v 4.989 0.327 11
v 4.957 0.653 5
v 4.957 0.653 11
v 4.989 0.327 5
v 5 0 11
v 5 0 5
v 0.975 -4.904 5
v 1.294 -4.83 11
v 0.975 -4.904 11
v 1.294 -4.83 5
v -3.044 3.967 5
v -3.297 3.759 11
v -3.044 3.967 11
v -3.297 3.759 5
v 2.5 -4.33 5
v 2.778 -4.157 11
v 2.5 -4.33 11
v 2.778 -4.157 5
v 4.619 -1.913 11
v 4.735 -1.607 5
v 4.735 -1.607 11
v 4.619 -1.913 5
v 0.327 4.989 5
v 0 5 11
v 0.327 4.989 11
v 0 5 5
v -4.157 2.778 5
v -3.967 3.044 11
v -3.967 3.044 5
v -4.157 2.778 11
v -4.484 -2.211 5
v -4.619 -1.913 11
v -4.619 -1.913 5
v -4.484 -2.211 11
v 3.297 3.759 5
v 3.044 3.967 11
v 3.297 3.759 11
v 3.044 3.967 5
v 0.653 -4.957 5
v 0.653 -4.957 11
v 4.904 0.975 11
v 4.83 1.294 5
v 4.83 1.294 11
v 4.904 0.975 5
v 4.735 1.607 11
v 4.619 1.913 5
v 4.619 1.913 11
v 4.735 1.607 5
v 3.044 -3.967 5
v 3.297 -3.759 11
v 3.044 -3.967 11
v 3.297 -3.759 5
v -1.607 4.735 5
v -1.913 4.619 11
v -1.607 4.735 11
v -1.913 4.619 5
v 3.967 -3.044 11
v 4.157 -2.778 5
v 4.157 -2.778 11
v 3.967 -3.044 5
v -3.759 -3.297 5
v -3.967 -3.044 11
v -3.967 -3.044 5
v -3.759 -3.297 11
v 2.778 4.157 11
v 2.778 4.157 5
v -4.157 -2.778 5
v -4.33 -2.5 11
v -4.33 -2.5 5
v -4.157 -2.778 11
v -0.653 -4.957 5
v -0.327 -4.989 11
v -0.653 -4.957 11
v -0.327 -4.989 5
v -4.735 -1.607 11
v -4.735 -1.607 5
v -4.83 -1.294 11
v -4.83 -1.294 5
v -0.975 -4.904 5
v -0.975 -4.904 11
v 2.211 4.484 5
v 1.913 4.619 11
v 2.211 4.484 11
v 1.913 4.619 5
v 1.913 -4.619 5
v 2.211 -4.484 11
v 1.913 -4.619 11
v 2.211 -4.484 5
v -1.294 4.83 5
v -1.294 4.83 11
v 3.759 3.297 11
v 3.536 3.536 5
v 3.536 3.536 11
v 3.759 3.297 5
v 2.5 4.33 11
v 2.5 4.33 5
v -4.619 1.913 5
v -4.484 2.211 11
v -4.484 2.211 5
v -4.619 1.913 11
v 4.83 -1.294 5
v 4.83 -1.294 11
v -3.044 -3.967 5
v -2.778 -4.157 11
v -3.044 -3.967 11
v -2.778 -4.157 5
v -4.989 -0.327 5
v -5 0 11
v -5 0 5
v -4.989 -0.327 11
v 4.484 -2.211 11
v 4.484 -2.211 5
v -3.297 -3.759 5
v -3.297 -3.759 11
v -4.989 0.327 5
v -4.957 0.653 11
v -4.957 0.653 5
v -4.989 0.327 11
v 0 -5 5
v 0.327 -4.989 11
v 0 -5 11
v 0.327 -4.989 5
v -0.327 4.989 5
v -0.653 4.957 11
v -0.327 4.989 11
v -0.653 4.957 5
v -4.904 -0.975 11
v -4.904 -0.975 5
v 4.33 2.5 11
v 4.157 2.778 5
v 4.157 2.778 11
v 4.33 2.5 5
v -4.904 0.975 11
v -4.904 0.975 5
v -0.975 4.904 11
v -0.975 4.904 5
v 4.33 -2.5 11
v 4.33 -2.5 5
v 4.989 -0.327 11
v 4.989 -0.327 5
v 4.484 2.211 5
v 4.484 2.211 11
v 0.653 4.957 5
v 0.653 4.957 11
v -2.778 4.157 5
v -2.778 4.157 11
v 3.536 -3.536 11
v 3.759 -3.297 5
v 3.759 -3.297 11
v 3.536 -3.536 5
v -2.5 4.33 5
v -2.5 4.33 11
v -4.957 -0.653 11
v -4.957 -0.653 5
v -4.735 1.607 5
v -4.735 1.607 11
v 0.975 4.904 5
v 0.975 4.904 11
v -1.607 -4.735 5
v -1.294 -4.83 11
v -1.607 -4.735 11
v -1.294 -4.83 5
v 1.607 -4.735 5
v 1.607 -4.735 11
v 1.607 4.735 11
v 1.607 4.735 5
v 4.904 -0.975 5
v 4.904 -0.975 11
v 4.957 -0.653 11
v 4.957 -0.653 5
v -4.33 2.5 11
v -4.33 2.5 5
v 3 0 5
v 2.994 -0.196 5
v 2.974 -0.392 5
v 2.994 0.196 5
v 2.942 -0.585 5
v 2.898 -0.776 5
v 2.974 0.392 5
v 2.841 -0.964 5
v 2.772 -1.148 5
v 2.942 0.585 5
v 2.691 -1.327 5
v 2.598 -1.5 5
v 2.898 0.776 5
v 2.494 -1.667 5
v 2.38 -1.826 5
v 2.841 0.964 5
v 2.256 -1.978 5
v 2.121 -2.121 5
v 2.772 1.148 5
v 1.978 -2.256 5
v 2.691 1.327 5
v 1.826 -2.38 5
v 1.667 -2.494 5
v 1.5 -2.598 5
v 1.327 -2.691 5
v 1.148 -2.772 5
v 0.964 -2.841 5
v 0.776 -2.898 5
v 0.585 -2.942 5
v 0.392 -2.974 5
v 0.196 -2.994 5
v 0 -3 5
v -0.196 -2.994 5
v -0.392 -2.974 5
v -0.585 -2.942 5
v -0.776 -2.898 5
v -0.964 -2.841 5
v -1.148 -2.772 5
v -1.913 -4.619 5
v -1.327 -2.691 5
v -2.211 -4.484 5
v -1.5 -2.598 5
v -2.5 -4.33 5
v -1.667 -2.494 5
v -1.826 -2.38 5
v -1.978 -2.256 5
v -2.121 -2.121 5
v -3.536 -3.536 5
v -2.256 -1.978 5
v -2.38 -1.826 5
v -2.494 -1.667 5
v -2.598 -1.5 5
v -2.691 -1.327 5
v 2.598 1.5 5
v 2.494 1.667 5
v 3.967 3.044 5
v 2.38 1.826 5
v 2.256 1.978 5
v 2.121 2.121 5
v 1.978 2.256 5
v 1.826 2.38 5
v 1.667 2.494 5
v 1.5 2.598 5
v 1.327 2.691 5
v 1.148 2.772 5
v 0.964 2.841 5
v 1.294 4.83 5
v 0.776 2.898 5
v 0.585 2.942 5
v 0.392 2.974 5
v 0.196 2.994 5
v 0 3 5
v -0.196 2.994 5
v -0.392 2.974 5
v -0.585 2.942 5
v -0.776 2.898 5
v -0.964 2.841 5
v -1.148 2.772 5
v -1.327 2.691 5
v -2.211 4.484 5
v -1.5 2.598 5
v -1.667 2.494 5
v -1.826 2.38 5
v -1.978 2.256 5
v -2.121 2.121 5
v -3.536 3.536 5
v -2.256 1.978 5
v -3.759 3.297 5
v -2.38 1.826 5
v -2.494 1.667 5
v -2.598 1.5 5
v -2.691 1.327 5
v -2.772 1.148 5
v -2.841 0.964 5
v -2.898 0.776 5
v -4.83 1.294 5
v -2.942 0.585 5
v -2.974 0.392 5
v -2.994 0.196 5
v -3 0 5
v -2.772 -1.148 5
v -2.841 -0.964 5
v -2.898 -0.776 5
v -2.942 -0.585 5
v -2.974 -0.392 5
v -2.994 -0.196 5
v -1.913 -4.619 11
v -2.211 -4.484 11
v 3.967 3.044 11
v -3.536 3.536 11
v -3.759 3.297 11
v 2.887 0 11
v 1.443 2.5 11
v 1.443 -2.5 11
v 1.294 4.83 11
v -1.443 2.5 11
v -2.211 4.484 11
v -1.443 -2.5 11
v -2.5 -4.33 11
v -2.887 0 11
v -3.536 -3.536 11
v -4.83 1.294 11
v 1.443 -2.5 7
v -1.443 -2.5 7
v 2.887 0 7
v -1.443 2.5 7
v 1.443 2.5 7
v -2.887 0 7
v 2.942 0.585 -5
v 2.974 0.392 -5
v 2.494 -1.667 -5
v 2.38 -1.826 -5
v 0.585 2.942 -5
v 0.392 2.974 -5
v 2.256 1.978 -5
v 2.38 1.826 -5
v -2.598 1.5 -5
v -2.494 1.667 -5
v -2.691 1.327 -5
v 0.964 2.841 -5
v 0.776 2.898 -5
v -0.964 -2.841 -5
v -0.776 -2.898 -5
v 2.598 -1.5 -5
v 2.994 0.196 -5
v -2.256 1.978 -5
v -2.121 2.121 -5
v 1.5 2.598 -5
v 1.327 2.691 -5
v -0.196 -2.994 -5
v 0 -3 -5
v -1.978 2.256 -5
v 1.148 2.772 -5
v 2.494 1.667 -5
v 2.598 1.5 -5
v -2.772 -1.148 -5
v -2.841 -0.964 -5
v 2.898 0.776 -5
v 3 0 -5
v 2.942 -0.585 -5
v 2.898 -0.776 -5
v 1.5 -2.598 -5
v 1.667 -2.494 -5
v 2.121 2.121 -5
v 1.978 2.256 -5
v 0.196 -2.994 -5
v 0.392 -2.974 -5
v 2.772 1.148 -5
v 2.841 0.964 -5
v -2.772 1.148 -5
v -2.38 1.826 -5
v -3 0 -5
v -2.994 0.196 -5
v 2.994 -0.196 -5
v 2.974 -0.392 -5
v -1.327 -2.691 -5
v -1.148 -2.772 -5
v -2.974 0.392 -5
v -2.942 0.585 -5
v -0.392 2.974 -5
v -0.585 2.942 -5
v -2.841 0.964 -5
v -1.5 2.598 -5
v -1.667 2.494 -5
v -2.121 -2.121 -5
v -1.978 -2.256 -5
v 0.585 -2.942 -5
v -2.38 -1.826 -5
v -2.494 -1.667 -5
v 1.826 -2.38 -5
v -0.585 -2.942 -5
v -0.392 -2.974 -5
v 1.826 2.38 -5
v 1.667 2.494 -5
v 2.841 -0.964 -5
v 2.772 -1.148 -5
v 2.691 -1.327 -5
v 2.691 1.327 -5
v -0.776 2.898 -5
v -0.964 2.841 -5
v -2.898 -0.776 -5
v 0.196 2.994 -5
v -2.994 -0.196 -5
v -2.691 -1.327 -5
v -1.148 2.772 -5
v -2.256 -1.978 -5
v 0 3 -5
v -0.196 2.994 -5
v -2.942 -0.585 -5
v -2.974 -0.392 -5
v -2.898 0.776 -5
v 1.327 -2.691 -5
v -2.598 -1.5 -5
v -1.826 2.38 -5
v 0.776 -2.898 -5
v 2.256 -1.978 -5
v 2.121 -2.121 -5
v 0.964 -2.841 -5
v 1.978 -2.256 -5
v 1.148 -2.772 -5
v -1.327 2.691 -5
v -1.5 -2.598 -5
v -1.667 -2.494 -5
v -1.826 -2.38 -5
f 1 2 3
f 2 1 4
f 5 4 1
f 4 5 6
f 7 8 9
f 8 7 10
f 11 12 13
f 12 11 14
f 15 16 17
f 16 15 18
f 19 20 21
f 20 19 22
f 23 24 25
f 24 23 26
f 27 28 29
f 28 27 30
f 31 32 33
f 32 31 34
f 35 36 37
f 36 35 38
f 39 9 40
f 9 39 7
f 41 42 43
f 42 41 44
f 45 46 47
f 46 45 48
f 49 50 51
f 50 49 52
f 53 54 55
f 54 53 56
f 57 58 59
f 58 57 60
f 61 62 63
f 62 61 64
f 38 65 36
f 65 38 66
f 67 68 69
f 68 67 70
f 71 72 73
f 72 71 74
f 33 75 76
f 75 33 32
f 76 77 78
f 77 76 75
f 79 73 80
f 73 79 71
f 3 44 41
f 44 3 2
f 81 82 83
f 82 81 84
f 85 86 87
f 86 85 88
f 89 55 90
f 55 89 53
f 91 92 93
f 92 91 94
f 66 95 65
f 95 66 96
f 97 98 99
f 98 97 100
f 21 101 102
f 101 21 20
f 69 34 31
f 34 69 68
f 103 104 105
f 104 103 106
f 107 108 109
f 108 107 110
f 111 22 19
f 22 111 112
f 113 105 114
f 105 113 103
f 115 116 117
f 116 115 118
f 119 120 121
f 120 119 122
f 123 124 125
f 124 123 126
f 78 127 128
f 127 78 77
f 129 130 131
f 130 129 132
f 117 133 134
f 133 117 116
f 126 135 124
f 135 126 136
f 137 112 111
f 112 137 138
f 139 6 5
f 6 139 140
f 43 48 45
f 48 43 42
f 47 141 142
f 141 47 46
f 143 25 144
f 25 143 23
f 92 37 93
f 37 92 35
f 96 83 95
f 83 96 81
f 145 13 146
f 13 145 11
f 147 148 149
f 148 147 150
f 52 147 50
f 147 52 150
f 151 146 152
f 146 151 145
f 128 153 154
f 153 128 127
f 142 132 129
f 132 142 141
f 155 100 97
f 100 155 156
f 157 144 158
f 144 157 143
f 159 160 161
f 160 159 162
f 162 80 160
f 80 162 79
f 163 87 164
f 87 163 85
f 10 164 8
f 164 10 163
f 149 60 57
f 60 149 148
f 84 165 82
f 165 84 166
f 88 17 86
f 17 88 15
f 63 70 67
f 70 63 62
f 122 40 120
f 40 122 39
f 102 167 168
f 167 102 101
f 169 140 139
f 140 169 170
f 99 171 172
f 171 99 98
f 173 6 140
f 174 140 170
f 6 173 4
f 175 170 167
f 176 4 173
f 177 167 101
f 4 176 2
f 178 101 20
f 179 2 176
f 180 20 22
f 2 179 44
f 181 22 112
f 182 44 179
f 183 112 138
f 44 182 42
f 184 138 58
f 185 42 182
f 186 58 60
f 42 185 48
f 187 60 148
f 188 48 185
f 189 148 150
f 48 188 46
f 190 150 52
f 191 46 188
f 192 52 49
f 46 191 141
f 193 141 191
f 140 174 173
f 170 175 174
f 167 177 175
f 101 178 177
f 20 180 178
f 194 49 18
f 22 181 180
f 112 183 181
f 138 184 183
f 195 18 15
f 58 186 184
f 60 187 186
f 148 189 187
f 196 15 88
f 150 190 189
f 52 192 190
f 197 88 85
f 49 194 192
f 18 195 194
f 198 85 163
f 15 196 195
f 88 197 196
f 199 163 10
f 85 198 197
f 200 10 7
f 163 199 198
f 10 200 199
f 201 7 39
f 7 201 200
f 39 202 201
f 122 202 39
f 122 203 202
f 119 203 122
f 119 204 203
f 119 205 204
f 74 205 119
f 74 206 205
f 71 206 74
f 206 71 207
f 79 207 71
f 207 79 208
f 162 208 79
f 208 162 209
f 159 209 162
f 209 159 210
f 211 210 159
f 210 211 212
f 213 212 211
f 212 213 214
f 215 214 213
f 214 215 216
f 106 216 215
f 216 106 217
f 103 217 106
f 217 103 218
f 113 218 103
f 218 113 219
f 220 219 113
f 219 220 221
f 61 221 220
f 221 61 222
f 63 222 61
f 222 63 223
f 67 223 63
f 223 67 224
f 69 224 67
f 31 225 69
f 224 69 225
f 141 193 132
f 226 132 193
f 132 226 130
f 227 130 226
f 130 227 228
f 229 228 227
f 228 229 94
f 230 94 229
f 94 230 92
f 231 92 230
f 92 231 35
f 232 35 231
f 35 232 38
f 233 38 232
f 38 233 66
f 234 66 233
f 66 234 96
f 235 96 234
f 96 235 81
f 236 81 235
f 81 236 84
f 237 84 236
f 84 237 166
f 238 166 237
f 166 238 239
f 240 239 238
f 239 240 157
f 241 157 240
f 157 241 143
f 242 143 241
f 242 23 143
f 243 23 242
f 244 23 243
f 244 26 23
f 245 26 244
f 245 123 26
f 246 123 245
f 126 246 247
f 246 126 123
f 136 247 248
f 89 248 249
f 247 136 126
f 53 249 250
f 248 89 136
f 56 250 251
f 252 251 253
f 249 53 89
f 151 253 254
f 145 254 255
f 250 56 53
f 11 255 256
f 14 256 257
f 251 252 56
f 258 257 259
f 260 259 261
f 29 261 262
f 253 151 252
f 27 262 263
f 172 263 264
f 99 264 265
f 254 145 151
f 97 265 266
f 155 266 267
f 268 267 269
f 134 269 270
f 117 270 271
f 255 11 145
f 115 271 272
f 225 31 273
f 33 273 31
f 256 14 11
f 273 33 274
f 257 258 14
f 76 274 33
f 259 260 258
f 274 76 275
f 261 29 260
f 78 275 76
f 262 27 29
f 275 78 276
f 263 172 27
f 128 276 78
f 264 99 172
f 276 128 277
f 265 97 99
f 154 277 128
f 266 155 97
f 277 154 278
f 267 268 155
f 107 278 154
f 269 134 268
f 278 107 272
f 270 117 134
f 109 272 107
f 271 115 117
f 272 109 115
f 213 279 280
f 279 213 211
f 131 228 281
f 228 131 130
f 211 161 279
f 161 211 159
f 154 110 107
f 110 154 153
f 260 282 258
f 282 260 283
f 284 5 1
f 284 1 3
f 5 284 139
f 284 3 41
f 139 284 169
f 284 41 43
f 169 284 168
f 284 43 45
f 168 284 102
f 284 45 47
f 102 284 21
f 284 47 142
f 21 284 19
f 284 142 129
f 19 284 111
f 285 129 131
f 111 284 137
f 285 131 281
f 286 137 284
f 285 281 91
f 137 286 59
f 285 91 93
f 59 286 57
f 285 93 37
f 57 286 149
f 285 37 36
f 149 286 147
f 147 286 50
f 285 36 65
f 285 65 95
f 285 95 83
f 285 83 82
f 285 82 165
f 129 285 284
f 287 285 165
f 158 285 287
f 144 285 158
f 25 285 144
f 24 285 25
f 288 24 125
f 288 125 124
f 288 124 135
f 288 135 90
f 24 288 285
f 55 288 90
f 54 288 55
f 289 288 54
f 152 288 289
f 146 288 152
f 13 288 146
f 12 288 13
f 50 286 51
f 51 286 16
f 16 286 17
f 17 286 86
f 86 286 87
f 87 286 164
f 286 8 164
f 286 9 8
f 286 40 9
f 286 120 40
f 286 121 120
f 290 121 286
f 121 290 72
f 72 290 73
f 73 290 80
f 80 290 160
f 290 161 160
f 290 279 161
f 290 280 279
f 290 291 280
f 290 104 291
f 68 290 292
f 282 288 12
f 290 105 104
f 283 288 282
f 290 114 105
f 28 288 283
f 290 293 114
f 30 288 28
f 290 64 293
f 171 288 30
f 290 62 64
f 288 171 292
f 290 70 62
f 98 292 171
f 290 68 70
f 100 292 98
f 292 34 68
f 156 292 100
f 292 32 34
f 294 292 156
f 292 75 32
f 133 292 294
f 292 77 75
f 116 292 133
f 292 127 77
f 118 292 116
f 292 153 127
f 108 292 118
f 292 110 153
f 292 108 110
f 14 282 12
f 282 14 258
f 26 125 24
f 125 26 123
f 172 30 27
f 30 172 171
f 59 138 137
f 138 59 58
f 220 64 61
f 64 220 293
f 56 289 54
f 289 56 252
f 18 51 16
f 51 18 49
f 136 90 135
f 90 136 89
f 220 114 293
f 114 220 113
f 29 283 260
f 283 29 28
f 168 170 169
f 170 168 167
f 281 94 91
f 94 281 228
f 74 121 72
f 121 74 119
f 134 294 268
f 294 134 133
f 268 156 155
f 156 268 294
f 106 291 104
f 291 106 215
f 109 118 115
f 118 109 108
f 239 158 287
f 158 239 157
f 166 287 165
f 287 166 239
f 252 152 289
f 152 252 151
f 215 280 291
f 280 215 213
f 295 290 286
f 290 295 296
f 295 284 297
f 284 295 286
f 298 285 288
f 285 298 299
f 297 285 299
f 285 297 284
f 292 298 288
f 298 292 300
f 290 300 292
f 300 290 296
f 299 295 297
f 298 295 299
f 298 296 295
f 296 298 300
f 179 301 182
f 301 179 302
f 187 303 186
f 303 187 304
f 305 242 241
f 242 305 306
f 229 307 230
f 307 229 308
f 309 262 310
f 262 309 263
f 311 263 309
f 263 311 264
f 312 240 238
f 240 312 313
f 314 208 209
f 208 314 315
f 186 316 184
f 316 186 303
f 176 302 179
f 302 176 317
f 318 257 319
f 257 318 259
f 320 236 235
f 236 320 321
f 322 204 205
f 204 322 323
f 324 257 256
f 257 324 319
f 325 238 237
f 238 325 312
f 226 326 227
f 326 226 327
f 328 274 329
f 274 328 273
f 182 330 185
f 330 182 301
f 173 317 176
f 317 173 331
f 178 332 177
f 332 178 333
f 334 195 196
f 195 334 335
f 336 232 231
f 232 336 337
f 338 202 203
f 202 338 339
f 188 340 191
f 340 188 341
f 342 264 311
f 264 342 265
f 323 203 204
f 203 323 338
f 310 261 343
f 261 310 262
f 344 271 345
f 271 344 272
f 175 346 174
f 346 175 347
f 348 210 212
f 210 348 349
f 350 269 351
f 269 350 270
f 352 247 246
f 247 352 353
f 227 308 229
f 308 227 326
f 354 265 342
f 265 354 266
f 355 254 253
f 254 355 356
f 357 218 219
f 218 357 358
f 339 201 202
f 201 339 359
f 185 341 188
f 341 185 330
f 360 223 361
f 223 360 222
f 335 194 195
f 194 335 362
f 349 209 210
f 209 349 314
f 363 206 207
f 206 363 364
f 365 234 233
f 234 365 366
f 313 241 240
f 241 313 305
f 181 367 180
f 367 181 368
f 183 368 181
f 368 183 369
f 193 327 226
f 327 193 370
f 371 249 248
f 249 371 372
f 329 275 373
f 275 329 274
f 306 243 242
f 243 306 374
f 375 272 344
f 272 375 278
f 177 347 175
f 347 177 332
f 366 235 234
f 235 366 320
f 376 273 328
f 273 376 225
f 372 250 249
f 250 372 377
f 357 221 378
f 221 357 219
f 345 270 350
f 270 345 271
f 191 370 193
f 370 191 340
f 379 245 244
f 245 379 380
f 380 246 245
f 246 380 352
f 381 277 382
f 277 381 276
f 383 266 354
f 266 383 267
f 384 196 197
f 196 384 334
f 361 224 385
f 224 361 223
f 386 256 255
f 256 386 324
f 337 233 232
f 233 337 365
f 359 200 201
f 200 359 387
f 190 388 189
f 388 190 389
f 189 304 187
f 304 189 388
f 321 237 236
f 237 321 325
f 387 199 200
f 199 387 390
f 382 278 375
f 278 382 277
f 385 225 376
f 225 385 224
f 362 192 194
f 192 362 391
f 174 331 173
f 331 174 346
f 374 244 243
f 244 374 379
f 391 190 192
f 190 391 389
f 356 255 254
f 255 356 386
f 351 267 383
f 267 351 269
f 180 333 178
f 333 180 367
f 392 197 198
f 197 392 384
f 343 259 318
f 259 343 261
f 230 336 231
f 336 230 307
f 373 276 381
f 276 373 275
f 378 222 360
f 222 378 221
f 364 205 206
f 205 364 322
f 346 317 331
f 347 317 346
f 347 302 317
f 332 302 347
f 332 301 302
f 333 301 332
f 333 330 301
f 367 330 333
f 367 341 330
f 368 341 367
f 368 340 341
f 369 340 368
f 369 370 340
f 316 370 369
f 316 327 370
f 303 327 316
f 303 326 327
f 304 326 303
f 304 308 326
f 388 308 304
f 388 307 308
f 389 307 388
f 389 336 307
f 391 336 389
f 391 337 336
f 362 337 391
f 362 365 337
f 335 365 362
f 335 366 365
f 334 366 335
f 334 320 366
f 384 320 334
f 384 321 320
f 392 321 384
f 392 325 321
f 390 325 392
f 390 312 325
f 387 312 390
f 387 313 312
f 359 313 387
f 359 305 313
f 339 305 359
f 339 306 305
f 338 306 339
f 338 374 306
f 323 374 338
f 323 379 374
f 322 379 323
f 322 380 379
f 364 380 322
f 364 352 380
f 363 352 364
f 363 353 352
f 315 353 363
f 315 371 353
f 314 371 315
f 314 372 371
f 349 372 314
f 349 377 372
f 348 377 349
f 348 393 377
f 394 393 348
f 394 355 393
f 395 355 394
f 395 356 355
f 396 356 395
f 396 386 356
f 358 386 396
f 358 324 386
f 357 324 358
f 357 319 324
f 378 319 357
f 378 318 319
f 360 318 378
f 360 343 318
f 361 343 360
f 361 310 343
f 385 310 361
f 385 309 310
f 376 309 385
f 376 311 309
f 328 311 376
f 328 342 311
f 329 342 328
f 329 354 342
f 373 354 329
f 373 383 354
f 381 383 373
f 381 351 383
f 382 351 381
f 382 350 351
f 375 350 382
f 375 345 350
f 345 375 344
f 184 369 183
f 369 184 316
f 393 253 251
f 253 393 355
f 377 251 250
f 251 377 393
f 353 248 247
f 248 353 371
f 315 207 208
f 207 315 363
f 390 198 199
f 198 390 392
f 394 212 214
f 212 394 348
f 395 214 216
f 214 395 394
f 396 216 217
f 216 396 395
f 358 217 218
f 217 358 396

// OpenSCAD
$fn=96;

module socket_head_cap_screw(d=6.0, head_d=10.0, head_h=6.0, shank_l=10.0, socket_af=5.0, socket_depth=4.0, chamfer=0.6) {
    union() {
        // Shank (centered at origin along Z)
        translate([0,0,-shank_l/2])
            cylinder(h=shank_l, d=d);

        // Head on top of shank
        translate([0,0,shank_l/2])
        difference() {
            union() {
                cylinder(h=head_h, d=head_d);
                // Top chamfer
                translate([0,0,head_h-chamfer])
                    cylinder(h=chamfer, d1=head_d, d2=head_d-2*chamfer);
                // Bottom fillet-ish chamfer
                cylinder(h=chamfer, d1=head_d-2*chamfer, d2=head_d);
            }
            // Hex socket
            translate([0,0,head_h - socket_depth])
                cylinder(h=socket_depth + 0.02, d=socket_af / cos(30), $fn=6);
        }
    }
}

socket_head_cap_screw(d=6.0, head_d=10.0, head_h=6.0, shank_l=10.0, socket_af=5.0, socket_depth=4.0, chamfer=0.6);
